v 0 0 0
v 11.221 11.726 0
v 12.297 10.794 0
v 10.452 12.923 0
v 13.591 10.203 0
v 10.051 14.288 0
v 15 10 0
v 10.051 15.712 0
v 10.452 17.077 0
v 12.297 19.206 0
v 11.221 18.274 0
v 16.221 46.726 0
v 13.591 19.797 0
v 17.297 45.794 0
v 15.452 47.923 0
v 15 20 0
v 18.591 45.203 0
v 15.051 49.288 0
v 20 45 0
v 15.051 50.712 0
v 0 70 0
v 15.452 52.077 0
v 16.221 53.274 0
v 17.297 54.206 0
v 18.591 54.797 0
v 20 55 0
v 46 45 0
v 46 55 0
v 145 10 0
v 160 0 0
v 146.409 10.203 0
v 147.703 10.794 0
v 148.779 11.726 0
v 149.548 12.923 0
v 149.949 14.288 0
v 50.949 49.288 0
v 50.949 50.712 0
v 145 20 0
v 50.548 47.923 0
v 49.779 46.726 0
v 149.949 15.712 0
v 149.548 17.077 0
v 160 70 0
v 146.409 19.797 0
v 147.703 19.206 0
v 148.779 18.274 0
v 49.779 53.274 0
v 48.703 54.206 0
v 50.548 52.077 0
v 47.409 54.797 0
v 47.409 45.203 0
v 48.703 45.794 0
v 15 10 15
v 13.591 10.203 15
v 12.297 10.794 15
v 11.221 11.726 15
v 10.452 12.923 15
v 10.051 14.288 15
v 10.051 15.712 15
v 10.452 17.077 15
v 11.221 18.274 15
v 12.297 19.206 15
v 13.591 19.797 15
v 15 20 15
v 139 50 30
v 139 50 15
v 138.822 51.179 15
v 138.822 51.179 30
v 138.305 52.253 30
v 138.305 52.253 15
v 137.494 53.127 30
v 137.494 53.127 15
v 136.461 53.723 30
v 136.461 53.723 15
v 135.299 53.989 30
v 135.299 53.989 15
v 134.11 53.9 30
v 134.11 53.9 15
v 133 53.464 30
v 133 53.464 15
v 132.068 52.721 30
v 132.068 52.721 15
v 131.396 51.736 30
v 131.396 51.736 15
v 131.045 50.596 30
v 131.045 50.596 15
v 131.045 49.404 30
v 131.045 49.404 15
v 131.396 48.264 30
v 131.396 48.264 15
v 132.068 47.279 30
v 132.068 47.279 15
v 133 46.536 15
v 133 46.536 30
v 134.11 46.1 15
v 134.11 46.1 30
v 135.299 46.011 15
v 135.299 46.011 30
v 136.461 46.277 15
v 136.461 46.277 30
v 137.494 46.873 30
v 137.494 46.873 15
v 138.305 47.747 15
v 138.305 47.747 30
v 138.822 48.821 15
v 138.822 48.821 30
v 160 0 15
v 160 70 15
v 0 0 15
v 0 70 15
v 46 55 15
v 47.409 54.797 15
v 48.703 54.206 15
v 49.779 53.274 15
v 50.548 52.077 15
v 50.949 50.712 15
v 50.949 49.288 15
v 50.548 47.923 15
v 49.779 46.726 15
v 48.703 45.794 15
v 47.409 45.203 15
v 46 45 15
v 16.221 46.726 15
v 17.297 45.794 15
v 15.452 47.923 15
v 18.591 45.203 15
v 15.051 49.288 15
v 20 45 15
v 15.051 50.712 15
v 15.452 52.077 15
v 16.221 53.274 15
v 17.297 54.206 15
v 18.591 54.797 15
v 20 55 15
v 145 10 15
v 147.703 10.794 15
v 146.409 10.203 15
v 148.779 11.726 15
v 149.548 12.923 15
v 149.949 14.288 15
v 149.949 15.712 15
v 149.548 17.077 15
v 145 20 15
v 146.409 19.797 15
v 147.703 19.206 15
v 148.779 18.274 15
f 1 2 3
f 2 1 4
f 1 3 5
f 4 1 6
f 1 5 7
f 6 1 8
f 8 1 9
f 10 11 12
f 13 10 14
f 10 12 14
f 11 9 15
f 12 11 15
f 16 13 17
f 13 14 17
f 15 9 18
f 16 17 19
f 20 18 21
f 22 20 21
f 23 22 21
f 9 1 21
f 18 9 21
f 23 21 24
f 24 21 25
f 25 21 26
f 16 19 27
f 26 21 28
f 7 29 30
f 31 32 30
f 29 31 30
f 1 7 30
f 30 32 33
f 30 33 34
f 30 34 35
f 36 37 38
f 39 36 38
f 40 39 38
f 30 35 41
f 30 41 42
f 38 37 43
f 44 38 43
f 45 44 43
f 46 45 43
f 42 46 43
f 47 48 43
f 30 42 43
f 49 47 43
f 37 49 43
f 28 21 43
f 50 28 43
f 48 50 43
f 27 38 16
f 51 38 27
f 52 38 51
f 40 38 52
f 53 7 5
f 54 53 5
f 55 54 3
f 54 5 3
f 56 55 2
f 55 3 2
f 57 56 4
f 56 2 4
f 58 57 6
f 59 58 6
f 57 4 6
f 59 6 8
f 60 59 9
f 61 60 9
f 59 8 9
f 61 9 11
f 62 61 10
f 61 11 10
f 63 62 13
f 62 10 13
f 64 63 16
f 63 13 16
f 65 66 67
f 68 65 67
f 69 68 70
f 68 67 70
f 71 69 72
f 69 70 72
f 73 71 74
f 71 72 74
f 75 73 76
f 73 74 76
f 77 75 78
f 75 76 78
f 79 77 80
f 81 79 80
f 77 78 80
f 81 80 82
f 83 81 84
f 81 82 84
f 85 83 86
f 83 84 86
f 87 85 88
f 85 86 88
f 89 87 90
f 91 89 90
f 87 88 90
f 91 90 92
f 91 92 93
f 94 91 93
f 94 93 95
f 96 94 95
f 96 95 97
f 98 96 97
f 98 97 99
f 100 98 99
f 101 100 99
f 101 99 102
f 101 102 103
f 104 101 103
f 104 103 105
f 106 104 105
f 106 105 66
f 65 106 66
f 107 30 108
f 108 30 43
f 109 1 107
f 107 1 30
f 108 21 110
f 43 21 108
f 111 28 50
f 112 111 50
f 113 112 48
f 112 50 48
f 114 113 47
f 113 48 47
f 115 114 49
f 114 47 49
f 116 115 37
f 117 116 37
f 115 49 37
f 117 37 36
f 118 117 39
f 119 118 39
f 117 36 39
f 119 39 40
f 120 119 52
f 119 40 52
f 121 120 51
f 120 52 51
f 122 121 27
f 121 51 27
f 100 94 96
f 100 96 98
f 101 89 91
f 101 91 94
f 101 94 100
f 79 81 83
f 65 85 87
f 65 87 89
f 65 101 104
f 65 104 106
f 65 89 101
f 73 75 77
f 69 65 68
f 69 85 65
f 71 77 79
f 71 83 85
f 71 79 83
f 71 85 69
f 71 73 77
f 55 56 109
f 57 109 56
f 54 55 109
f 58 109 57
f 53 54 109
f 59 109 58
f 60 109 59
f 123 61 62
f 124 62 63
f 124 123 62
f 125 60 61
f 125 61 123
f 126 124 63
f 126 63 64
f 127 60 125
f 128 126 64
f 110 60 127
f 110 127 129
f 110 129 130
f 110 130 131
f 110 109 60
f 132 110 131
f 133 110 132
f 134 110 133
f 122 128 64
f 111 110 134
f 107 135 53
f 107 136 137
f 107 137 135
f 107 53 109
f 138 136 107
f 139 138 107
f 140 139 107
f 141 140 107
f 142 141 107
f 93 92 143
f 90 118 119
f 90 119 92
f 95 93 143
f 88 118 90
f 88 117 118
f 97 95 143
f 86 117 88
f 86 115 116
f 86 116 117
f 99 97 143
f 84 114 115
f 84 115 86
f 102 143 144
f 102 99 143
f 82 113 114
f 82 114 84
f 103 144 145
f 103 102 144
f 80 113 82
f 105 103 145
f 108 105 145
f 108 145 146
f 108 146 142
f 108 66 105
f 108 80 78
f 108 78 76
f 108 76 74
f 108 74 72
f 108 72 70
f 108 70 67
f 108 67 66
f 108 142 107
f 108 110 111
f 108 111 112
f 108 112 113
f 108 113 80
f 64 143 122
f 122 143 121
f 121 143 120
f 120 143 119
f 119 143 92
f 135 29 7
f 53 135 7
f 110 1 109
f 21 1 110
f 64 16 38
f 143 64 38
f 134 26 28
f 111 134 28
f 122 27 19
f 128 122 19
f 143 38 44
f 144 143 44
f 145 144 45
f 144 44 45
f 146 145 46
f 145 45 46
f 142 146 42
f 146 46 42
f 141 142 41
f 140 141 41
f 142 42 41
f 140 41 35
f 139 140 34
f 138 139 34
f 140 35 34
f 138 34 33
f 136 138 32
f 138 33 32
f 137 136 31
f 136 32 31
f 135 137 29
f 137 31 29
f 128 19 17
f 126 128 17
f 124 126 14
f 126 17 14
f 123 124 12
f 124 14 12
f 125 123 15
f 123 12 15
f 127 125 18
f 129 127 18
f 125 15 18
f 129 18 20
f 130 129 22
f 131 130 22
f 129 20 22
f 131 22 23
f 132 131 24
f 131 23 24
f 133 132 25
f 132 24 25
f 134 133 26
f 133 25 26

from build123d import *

# Parameters (mm, degrees)
F0_W     = 160
F0_H     = 70
F0_R     = 4
F1_DEPTH = 15
F2_DEPTH = 30


with BuildPart() as f1:
    # F0 (on Top) → F1 (new body)
    with BuildSketch(Plane.XY):
        with Locations((80, 35)):
            Rectangle(F0_W, F0_H)
        with BuildLine():
            ThreePointArc((15, 10), (10, 15), (15, 20))
            Line((15, 20), (145, 20))
            ThreePointArc((145, 20), (150, 15), (145, 10))
            Line((145, 10), (15, 10))
        make_face(mode=Mode.SUBTRACT)
        with BuildLine():
            ThreePointArc((20, 45), (15, 50), (20, 55))
            Line((20, 55), (46, 55))
            ThreePointArc((46, 55), (51, 50), (46, 45))
            Line((46, 45), (20, 45))
        make_face(mode=Mode.SUBTRACT)
        with Locations((135, 50)):
            Circle(F0_R, mode=Mode.SUBTRACT)
        with Locations((135, 50)):
            Circle(F0_R)
    extrude(amount=F1_DEPTH)

    # F0 (on Top) → F2 (join)
    with BuildSketch(Plane.XY):
        with Locations((135, 50)):
            Circle(F0_R)
    extrude(amount=F2_DEPTH)


solid = f1.part
